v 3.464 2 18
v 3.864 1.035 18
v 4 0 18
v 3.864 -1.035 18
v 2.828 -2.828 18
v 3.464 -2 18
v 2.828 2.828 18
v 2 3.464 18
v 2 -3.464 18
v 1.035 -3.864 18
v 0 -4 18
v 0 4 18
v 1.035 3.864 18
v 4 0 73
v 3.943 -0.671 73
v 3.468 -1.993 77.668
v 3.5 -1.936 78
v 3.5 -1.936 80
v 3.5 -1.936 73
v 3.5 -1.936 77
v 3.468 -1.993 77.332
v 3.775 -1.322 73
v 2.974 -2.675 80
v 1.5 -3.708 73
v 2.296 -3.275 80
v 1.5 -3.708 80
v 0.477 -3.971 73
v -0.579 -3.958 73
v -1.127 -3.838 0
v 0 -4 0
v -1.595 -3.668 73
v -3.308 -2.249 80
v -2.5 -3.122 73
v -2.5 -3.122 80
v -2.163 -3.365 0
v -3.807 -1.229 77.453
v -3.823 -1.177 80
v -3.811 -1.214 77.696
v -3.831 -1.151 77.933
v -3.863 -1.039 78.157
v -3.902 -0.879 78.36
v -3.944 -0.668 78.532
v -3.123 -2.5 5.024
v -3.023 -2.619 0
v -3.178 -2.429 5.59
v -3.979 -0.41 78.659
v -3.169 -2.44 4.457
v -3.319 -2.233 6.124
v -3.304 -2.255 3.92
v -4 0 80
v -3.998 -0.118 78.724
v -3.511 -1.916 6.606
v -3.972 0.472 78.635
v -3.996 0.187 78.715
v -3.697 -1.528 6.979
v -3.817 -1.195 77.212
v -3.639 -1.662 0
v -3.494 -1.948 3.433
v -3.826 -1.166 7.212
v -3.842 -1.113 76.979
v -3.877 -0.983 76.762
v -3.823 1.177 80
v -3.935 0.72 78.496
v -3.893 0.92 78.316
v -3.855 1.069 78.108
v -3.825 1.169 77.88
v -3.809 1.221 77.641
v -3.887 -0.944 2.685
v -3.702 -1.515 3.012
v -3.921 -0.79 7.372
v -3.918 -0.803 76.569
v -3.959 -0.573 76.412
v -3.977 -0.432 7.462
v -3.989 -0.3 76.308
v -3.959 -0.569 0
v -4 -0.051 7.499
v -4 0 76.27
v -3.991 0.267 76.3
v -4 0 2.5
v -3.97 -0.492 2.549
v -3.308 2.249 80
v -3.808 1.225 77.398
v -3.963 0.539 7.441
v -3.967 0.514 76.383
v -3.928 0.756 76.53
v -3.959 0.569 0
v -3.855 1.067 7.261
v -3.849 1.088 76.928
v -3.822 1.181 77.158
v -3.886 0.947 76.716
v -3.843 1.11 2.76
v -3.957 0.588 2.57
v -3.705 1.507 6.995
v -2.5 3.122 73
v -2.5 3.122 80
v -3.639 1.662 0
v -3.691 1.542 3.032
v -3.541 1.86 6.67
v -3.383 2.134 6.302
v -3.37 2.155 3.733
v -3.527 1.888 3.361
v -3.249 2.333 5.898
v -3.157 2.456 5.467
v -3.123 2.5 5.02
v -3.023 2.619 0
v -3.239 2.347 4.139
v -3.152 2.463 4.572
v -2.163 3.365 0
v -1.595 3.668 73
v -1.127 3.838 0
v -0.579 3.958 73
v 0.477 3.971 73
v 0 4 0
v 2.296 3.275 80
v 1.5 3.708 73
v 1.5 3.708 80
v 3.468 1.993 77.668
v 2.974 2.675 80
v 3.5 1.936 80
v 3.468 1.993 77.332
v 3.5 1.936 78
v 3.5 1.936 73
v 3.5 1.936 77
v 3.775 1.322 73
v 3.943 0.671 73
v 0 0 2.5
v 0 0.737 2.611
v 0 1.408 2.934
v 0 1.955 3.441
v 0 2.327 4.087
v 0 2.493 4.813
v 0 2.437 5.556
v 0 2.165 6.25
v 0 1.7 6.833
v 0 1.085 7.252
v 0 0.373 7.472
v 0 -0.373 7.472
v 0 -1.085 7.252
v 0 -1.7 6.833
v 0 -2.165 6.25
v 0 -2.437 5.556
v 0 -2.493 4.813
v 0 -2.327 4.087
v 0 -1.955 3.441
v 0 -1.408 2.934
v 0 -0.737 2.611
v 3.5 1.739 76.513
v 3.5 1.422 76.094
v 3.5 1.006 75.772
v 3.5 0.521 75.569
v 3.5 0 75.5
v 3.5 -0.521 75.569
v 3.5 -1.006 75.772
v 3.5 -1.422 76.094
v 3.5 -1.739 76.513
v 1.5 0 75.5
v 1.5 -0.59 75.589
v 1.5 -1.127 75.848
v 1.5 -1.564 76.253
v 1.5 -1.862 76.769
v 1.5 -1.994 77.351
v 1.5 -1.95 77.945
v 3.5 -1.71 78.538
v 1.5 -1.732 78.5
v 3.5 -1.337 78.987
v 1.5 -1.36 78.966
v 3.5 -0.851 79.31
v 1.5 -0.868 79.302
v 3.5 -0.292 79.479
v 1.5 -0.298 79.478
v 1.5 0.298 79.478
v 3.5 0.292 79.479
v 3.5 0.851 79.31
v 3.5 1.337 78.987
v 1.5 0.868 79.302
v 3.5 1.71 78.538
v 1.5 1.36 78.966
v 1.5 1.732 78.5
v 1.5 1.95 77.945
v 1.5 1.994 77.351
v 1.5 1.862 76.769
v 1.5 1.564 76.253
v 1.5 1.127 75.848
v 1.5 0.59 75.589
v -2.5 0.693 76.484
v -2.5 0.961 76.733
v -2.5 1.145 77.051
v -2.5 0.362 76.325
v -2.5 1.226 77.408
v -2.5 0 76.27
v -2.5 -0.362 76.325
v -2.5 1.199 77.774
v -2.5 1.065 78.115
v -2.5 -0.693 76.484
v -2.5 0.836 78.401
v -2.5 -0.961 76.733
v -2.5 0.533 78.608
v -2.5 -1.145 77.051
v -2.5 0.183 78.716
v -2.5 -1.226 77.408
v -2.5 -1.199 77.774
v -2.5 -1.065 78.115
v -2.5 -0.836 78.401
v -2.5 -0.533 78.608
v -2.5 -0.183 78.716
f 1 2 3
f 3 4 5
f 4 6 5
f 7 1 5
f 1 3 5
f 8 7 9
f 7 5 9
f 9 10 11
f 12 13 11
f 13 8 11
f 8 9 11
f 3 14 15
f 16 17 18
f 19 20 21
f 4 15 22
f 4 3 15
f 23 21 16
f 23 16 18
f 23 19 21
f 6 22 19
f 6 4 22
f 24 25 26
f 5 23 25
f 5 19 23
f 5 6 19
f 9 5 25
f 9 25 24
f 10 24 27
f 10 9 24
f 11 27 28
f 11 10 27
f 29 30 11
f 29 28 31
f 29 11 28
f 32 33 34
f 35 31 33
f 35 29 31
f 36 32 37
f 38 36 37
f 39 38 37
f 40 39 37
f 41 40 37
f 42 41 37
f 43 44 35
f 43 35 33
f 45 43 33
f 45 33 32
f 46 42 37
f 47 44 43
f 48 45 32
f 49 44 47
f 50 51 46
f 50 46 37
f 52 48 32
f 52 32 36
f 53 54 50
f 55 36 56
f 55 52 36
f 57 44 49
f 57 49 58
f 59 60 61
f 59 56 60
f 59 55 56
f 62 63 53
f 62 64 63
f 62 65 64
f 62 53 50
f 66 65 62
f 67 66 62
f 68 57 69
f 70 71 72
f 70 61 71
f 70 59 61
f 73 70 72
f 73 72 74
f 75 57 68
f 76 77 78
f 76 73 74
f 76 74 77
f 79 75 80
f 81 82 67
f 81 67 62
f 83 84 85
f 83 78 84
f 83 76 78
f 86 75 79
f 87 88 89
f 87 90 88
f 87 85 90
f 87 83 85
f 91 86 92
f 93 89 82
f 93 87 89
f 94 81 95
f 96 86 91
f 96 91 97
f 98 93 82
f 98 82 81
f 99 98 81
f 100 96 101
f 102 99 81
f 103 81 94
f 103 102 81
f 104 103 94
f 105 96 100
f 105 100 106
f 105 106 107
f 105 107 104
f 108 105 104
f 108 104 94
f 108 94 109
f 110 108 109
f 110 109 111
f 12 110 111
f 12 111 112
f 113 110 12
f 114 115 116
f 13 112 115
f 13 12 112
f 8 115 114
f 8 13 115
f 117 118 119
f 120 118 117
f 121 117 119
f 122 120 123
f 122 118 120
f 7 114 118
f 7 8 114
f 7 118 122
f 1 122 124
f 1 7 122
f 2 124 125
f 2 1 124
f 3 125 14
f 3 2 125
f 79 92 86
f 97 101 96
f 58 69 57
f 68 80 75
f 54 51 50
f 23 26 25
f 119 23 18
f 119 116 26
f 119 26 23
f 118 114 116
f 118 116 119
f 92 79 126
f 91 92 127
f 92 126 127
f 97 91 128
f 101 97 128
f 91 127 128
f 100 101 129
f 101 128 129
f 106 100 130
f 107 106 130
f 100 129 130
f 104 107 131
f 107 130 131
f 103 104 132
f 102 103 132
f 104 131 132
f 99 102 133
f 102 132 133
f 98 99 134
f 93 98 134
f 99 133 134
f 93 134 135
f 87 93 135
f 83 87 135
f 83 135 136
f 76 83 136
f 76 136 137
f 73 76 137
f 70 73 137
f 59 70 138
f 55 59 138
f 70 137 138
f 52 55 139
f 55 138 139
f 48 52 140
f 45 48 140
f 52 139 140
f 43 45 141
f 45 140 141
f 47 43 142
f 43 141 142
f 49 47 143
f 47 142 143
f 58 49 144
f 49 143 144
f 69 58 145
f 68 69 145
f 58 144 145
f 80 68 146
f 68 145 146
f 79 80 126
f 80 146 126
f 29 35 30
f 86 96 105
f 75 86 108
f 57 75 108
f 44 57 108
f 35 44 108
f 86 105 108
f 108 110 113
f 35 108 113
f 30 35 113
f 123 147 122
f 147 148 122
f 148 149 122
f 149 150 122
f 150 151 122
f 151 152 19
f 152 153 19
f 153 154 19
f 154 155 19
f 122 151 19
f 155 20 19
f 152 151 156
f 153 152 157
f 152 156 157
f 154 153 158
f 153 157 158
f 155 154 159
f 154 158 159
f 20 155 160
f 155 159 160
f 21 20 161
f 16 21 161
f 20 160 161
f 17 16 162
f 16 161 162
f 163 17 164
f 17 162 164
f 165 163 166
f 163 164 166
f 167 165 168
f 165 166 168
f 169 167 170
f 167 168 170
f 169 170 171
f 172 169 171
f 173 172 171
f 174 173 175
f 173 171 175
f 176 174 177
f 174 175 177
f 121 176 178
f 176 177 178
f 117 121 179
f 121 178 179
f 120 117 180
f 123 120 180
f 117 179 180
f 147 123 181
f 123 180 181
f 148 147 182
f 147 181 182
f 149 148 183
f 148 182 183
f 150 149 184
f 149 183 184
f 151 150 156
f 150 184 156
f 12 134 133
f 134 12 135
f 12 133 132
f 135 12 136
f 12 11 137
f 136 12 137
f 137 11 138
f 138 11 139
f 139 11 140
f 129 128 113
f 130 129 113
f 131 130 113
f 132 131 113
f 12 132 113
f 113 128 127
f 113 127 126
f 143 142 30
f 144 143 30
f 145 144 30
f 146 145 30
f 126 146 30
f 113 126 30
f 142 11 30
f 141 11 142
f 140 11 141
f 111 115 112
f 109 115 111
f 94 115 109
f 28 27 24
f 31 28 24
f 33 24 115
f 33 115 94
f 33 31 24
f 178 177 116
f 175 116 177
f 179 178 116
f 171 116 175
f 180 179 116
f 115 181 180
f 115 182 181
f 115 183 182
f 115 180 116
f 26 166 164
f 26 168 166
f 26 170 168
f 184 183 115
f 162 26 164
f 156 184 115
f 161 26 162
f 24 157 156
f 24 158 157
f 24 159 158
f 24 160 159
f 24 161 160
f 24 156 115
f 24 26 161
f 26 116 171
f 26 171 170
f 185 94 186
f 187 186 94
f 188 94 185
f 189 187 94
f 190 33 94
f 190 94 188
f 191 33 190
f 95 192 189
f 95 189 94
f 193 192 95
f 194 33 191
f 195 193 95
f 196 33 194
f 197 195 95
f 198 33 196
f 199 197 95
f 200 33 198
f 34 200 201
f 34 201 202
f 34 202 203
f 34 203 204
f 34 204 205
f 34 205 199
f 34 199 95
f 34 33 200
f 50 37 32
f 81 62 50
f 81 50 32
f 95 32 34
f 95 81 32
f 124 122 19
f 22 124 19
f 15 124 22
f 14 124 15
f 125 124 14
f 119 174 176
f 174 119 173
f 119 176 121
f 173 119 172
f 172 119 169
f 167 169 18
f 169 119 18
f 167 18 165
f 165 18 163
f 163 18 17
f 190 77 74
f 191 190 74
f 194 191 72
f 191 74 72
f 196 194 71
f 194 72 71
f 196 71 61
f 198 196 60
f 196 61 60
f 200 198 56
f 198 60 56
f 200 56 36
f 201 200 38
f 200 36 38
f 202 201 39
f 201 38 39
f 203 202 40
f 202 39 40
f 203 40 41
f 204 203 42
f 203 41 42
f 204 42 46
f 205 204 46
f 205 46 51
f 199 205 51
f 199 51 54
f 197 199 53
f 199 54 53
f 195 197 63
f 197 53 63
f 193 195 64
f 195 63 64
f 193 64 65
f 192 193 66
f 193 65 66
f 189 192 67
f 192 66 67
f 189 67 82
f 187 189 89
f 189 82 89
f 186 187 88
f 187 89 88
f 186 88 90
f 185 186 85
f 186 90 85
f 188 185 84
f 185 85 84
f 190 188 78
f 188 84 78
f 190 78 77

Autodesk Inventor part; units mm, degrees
ref_plane "YZ Plane" through (0, 0, 0) normal (1, 0, 0) x (0, 1, 0)
ref_plane "XZ Plane" through (0, 0, 0) normal (0, 1, 0) x (-1, 0, 0)
ref_plane "XY Plane" through (0, 0, 0) normal (0, 0, 1) x (1, 0, 0)
sketch "Sketch1" plane through (0, 0, 0) normal (0, 0, 1) x (1, 0, 0)
  circle A0 centre (0, 0) radius 4
  dimension "d0" = 8
extrude "Extrusion1" add sketch "Sketch1" along normal blind 80
sketch "Sketch2" plane through (0, 0, 0) normal (0, 1, 0) x (-1, 0, 0)
  line L0 (0, 0) -> (-5.3393, 0)
  line L1 (-5.3393, 0) -> (-5.3393, 18)
  line L2 (-5.3393, 18) -> (0, 18)
  line L3 (0, 18) -> (0, 0)
  line L4 (2.5, 80) -> (-1.5, 80)
  line L5 (-1.5, 80) -> (-1.5, 73)
  line L6 (-1.5, 73) -> (2.5, 73)
  line L7 (2.5, 73) -> (2.5, 80)
  line L8 (4, 80) -> (-4, 80) construction
  line L9 (-4, 80) -> (-3.5, 80)
  line L10 (-3.5, 80) -> (-3.5, 73)
  line L11 (-3.5, 73) -> (-4, 73)
  line L12 (-4, 73) -> (-4, 80)
  point P0 (-3.75, 73)
  dimension "d3" = 4
  dimension "d4" = 7
  dimension "d5" = 2.5
  dimension "d6" = 18
  dimension "d9" = 2
extrude "Extrusion2" cut sketch "Sketch2" along normal through all both and the other way through all
sketch "Sketch3" plane through (3.5, -1.9365, 73) normal (1, 0, 0) x (0, 0, -1)
  circle A0 centre (-4.5, 1.9365) radius 1.5
  line L0 (-7, 0) -> (-7, 3.873) projected
  point P0 (73, 1.9365)
  point P1 (-7, 1.9365)
  dimension "d10" = 3
  dimension "d11" = 2.5
hole "Hole1" at (3.5, 0, 77.5) direction (-1, 0, 0) diameter 2.459 end through all counterbore diameter 4 counterbore depth 3 thread size "M3x0.5" class "6H" standard "ISO Metric profile"
sketch "Sketch4" plane through (0, -4, 18) normal (1, 0, 0) x (0, 0, -1)
  circle A0 centre (13, 4) radius 2.5
  line L0 (18, 8) -> (18, 0) projected
  point P0 (18, 4)
  dimension "d19" = 5
  dimension "d22" = 5
extrude "Extrusion3" cut sketch "Sketch4" against normal through all
properties part number "Servo_Strut" material "Steel, Carbon"
